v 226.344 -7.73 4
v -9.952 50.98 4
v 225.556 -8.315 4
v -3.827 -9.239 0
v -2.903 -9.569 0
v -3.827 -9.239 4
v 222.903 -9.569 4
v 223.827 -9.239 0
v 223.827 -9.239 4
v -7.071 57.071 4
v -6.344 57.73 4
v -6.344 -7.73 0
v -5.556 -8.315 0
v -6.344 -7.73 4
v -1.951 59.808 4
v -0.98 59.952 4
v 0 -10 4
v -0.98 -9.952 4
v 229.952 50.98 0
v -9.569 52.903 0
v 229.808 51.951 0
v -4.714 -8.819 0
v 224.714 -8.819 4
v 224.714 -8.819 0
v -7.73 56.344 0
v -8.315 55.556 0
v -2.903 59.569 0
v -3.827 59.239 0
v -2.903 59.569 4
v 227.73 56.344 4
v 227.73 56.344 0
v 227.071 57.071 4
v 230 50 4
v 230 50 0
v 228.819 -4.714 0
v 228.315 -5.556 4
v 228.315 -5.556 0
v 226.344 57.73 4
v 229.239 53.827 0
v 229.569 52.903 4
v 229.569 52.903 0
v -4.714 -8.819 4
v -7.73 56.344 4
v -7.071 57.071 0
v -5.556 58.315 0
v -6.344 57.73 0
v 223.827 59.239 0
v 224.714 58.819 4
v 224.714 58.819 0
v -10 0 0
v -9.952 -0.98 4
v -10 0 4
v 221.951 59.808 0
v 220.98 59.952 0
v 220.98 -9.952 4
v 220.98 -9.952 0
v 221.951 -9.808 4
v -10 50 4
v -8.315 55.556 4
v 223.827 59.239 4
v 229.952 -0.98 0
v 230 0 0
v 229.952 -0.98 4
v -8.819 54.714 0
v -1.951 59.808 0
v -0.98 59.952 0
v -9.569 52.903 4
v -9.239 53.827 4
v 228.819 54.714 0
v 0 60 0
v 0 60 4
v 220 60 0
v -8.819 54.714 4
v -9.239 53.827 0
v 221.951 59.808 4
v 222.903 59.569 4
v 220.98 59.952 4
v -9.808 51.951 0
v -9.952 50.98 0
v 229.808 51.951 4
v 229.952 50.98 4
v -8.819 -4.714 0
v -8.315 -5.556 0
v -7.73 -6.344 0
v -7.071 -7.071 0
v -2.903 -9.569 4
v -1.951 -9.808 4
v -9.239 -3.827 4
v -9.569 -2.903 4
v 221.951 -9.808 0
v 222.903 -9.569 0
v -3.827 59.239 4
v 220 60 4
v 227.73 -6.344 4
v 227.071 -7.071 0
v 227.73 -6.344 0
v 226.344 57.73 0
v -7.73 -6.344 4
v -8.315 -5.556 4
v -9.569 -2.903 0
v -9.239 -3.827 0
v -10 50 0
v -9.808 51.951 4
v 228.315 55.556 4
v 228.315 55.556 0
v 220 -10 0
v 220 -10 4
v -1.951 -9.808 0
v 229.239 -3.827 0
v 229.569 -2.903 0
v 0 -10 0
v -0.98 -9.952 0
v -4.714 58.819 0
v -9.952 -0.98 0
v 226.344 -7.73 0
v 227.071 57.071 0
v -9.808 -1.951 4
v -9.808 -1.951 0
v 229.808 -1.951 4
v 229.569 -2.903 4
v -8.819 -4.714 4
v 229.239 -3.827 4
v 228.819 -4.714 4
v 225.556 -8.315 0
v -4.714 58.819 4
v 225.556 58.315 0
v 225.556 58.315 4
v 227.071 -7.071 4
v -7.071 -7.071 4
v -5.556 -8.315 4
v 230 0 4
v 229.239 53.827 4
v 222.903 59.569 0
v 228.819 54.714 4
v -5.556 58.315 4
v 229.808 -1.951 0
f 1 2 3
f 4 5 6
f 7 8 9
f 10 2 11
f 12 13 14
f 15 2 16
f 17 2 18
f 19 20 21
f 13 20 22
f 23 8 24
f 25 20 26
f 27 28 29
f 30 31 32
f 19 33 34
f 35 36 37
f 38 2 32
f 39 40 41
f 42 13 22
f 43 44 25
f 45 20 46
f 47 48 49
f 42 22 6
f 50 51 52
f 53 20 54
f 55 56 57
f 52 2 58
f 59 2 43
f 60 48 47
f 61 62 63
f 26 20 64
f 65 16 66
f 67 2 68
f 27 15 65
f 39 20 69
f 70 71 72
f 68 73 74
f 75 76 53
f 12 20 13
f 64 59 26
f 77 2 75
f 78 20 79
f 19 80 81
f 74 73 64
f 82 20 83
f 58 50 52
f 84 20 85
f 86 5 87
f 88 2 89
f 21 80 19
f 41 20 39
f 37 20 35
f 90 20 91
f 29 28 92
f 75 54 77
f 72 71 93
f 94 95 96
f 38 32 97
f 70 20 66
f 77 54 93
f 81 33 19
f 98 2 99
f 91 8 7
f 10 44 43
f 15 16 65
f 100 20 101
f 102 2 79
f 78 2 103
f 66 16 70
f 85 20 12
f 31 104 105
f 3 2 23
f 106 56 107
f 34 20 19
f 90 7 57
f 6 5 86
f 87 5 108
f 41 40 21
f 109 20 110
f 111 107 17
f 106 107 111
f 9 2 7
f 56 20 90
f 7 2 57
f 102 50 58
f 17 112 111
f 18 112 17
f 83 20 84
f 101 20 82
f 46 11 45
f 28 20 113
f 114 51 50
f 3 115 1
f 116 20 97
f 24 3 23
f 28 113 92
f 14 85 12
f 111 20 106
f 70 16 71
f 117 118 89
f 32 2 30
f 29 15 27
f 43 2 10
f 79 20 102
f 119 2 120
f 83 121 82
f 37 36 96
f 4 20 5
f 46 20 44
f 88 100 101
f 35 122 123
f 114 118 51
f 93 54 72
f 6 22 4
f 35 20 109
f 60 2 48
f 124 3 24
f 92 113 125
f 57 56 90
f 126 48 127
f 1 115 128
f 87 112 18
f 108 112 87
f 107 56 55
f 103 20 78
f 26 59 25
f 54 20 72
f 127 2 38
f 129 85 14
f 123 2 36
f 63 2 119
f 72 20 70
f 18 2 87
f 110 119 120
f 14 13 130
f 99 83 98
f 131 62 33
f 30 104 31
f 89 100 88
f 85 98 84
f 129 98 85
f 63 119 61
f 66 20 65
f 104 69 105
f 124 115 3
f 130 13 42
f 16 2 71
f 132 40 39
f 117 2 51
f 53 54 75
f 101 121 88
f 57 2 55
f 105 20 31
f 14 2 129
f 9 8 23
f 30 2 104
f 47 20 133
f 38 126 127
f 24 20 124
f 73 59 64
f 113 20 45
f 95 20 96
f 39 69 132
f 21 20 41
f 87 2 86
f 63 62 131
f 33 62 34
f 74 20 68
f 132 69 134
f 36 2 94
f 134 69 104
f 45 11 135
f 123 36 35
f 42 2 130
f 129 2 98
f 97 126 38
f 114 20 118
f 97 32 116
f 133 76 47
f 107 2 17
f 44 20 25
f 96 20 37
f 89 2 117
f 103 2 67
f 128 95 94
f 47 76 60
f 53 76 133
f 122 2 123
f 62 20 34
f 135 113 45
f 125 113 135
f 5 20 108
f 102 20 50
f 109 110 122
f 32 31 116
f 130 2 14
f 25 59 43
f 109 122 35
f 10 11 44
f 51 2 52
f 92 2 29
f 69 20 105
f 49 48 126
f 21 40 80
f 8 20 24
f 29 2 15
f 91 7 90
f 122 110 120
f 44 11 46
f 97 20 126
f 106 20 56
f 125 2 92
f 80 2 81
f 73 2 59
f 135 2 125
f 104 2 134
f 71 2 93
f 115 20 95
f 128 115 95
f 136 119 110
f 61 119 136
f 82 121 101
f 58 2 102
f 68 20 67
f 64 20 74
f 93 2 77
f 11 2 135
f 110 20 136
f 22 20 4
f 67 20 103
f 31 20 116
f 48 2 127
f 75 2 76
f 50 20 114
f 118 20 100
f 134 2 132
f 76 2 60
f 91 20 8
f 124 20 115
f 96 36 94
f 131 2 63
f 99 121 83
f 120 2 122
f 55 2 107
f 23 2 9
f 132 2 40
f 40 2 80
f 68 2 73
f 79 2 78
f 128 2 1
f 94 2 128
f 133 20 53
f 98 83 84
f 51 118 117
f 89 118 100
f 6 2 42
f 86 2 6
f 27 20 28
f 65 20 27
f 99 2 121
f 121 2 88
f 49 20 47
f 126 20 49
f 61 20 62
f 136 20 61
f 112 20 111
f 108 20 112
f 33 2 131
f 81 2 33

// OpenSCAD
$fn=64;
minkowski()
{
    cube([220, 50, 2]);
    cylinder(h=2, r=10);
}
